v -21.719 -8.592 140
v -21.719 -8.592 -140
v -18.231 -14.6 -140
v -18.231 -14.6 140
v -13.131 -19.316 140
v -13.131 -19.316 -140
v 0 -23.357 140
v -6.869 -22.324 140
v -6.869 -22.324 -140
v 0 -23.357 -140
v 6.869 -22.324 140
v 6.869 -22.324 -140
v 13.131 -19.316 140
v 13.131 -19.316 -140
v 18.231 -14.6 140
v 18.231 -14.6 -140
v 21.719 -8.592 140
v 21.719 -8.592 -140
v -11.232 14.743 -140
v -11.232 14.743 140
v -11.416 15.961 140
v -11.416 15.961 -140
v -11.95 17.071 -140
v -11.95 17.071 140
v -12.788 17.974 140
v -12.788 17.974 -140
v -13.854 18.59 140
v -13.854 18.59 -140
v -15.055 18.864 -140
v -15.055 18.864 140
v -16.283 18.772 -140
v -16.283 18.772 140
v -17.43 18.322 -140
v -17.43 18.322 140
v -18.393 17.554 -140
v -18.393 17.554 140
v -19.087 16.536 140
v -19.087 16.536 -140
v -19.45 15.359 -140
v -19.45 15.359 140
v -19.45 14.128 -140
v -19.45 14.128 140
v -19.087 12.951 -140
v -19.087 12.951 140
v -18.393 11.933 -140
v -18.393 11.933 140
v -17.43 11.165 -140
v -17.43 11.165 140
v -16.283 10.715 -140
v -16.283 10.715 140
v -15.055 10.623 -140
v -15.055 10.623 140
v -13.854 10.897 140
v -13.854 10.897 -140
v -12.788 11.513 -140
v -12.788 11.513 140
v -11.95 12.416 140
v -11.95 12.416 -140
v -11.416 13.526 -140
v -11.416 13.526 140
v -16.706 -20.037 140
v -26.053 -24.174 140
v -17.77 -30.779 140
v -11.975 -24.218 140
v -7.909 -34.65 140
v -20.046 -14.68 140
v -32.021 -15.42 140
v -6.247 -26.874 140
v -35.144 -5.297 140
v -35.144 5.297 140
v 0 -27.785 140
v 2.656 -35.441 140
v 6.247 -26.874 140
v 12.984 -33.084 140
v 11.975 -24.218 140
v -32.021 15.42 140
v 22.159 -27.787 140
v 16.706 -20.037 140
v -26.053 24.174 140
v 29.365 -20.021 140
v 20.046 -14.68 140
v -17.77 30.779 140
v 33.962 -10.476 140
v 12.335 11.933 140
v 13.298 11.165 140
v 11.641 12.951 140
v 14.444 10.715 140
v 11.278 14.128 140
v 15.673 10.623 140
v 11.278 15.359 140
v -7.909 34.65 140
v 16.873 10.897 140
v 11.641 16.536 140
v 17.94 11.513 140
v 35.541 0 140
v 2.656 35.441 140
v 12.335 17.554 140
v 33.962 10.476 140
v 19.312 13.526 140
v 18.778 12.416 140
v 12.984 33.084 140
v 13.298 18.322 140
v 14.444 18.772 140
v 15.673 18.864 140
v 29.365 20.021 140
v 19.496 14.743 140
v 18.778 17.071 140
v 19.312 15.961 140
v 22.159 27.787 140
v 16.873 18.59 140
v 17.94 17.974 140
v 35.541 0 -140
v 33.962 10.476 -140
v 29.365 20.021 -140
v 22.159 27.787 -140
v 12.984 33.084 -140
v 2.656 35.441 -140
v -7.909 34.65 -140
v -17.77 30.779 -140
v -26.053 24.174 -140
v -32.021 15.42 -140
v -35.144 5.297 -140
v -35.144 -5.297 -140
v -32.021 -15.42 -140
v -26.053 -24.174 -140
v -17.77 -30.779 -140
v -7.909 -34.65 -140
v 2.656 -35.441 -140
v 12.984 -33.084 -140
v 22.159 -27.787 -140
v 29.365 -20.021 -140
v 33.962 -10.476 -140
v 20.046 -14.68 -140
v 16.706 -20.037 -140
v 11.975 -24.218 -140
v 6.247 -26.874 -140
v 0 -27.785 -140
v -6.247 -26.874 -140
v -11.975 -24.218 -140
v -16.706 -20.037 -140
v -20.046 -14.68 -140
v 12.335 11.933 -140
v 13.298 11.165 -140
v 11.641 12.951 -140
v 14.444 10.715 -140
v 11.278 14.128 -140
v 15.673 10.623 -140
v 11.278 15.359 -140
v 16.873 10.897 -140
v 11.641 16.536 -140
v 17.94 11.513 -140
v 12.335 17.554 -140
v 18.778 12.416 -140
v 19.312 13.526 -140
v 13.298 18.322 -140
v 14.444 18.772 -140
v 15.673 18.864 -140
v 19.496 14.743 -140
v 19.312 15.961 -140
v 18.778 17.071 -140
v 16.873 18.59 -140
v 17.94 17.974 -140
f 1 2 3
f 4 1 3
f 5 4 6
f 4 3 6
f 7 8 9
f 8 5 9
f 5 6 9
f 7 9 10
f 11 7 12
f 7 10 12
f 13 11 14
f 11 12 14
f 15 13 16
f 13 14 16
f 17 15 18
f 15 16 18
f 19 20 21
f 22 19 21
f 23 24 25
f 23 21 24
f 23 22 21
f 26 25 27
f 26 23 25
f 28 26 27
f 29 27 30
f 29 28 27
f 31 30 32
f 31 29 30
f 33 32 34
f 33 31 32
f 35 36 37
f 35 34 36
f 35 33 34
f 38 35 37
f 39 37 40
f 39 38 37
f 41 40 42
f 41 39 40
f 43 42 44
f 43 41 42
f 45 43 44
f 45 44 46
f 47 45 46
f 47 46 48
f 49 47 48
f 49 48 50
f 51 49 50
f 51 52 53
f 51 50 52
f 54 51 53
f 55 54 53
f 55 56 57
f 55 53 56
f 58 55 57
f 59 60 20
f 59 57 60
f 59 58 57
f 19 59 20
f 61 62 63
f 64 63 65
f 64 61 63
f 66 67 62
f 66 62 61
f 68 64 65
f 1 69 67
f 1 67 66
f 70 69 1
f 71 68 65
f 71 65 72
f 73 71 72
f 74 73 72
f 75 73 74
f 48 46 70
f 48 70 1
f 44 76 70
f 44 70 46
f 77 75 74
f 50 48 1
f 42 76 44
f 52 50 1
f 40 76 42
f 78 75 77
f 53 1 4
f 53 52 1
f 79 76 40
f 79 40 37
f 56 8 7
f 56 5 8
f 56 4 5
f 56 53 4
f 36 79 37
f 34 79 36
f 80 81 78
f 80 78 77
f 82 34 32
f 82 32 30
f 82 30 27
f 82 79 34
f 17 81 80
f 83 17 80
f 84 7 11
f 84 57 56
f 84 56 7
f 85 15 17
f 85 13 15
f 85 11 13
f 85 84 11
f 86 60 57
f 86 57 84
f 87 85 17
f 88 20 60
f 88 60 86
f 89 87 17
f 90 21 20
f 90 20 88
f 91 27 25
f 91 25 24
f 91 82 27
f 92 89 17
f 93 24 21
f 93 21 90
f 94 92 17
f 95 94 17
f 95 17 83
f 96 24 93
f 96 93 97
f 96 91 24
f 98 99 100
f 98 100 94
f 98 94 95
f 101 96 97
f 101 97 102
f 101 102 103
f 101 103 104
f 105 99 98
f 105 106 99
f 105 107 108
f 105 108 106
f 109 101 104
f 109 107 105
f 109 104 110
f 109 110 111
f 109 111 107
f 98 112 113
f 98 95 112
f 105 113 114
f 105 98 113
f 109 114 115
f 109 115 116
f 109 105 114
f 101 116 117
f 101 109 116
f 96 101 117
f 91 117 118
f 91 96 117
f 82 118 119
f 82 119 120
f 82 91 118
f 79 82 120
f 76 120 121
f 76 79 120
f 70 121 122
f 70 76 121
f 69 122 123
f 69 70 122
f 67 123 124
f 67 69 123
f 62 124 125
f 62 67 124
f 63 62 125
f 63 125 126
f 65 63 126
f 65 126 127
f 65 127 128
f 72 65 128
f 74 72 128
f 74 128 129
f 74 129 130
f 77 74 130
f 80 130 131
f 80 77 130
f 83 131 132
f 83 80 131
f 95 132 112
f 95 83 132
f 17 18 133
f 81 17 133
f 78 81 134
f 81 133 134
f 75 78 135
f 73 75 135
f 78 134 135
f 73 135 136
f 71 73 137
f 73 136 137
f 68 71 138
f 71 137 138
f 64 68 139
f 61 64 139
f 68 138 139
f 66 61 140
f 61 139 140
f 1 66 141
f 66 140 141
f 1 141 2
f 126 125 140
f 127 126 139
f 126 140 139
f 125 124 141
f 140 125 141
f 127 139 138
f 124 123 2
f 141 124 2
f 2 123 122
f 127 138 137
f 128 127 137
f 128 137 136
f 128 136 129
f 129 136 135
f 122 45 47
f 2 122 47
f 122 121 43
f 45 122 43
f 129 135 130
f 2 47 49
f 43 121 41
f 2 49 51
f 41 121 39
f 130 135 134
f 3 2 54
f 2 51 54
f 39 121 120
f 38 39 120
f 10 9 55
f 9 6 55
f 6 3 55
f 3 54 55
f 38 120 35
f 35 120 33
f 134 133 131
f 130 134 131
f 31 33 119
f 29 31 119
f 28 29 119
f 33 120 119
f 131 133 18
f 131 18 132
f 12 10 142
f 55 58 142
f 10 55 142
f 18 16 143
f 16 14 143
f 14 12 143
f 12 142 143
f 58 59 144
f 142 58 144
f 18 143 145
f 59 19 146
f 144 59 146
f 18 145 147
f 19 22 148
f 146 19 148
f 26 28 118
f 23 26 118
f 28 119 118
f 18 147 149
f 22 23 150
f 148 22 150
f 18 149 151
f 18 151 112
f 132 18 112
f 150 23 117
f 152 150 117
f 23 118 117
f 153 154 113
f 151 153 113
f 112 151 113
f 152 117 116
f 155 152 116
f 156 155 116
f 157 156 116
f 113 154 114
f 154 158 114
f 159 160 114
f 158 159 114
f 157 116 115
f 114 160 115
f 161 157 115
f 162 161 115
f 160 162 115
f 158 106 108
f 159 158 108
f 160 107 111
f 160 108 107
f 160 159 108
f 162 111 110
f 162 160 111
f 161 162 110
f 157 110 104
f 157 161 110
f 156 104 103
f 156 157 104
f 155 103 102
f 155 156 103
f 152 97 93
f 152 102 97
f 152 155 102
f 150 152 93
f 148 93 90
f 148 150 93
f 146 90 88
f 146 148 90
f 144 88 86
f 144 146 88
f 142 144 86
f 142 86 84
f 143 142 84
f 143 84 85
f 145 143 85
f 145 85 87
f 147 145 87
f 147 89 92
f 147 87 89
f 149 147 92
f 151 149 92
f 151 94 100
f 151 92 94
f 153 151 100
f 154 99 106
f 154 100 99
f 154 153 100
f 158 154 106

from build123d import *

# Parameters (mm, degrees)
SKETCH1_R               = 35.5406
BOSS_EXTRUDE1_DEPTH     = 140
CUT_EXTRUDE1_DEPTH      = 285.475426877
CUT_EXTRUDE1_DEPTH_BACK = 285.475426877
SKETCH3_R               = 4.131775048


with BuildPart() as part:
    # Sketch1 → Boss-Extrude1 (new, symmetric)
    with BuildSketch(Plane.XY):
        Circle(SKETCH1_R)
    extrude(amount=BOSS_EXTRUDE1_DEPTH, both=True)

    # Sketch3 → Cut-Extrude1 (cut, two sides: drawn at the far end of the back side and taken through both)
    with BuildSketch(Plane.XY.offset(140).offset(-CUT_EXTRUDE1_DEPTH_BACK)):
        with Locations((-15.363902822, 14.74340124)):
            Circle(SKETCH3_R)
        with Locations((15.363902822, 14.74340124)):
            Circle(SKETCH3_R)
        with BuildLine():
            ThreePointArc((-21.71870656, -8.592271503), (0, -23.356569616), (21.71870656, -8.592271503))
            ThreePointArc((21.71870656, -8.592271503), (0, -27.784875685), (-21.71870656, -8.592271503))
        make_face()
    extrude(amount=CUT_EXTRUDE1_DEPTH + CUT_EXTRUDE1_DEPTH_BACK, mode=Mode.SUBTRACT)


solid = part.part
